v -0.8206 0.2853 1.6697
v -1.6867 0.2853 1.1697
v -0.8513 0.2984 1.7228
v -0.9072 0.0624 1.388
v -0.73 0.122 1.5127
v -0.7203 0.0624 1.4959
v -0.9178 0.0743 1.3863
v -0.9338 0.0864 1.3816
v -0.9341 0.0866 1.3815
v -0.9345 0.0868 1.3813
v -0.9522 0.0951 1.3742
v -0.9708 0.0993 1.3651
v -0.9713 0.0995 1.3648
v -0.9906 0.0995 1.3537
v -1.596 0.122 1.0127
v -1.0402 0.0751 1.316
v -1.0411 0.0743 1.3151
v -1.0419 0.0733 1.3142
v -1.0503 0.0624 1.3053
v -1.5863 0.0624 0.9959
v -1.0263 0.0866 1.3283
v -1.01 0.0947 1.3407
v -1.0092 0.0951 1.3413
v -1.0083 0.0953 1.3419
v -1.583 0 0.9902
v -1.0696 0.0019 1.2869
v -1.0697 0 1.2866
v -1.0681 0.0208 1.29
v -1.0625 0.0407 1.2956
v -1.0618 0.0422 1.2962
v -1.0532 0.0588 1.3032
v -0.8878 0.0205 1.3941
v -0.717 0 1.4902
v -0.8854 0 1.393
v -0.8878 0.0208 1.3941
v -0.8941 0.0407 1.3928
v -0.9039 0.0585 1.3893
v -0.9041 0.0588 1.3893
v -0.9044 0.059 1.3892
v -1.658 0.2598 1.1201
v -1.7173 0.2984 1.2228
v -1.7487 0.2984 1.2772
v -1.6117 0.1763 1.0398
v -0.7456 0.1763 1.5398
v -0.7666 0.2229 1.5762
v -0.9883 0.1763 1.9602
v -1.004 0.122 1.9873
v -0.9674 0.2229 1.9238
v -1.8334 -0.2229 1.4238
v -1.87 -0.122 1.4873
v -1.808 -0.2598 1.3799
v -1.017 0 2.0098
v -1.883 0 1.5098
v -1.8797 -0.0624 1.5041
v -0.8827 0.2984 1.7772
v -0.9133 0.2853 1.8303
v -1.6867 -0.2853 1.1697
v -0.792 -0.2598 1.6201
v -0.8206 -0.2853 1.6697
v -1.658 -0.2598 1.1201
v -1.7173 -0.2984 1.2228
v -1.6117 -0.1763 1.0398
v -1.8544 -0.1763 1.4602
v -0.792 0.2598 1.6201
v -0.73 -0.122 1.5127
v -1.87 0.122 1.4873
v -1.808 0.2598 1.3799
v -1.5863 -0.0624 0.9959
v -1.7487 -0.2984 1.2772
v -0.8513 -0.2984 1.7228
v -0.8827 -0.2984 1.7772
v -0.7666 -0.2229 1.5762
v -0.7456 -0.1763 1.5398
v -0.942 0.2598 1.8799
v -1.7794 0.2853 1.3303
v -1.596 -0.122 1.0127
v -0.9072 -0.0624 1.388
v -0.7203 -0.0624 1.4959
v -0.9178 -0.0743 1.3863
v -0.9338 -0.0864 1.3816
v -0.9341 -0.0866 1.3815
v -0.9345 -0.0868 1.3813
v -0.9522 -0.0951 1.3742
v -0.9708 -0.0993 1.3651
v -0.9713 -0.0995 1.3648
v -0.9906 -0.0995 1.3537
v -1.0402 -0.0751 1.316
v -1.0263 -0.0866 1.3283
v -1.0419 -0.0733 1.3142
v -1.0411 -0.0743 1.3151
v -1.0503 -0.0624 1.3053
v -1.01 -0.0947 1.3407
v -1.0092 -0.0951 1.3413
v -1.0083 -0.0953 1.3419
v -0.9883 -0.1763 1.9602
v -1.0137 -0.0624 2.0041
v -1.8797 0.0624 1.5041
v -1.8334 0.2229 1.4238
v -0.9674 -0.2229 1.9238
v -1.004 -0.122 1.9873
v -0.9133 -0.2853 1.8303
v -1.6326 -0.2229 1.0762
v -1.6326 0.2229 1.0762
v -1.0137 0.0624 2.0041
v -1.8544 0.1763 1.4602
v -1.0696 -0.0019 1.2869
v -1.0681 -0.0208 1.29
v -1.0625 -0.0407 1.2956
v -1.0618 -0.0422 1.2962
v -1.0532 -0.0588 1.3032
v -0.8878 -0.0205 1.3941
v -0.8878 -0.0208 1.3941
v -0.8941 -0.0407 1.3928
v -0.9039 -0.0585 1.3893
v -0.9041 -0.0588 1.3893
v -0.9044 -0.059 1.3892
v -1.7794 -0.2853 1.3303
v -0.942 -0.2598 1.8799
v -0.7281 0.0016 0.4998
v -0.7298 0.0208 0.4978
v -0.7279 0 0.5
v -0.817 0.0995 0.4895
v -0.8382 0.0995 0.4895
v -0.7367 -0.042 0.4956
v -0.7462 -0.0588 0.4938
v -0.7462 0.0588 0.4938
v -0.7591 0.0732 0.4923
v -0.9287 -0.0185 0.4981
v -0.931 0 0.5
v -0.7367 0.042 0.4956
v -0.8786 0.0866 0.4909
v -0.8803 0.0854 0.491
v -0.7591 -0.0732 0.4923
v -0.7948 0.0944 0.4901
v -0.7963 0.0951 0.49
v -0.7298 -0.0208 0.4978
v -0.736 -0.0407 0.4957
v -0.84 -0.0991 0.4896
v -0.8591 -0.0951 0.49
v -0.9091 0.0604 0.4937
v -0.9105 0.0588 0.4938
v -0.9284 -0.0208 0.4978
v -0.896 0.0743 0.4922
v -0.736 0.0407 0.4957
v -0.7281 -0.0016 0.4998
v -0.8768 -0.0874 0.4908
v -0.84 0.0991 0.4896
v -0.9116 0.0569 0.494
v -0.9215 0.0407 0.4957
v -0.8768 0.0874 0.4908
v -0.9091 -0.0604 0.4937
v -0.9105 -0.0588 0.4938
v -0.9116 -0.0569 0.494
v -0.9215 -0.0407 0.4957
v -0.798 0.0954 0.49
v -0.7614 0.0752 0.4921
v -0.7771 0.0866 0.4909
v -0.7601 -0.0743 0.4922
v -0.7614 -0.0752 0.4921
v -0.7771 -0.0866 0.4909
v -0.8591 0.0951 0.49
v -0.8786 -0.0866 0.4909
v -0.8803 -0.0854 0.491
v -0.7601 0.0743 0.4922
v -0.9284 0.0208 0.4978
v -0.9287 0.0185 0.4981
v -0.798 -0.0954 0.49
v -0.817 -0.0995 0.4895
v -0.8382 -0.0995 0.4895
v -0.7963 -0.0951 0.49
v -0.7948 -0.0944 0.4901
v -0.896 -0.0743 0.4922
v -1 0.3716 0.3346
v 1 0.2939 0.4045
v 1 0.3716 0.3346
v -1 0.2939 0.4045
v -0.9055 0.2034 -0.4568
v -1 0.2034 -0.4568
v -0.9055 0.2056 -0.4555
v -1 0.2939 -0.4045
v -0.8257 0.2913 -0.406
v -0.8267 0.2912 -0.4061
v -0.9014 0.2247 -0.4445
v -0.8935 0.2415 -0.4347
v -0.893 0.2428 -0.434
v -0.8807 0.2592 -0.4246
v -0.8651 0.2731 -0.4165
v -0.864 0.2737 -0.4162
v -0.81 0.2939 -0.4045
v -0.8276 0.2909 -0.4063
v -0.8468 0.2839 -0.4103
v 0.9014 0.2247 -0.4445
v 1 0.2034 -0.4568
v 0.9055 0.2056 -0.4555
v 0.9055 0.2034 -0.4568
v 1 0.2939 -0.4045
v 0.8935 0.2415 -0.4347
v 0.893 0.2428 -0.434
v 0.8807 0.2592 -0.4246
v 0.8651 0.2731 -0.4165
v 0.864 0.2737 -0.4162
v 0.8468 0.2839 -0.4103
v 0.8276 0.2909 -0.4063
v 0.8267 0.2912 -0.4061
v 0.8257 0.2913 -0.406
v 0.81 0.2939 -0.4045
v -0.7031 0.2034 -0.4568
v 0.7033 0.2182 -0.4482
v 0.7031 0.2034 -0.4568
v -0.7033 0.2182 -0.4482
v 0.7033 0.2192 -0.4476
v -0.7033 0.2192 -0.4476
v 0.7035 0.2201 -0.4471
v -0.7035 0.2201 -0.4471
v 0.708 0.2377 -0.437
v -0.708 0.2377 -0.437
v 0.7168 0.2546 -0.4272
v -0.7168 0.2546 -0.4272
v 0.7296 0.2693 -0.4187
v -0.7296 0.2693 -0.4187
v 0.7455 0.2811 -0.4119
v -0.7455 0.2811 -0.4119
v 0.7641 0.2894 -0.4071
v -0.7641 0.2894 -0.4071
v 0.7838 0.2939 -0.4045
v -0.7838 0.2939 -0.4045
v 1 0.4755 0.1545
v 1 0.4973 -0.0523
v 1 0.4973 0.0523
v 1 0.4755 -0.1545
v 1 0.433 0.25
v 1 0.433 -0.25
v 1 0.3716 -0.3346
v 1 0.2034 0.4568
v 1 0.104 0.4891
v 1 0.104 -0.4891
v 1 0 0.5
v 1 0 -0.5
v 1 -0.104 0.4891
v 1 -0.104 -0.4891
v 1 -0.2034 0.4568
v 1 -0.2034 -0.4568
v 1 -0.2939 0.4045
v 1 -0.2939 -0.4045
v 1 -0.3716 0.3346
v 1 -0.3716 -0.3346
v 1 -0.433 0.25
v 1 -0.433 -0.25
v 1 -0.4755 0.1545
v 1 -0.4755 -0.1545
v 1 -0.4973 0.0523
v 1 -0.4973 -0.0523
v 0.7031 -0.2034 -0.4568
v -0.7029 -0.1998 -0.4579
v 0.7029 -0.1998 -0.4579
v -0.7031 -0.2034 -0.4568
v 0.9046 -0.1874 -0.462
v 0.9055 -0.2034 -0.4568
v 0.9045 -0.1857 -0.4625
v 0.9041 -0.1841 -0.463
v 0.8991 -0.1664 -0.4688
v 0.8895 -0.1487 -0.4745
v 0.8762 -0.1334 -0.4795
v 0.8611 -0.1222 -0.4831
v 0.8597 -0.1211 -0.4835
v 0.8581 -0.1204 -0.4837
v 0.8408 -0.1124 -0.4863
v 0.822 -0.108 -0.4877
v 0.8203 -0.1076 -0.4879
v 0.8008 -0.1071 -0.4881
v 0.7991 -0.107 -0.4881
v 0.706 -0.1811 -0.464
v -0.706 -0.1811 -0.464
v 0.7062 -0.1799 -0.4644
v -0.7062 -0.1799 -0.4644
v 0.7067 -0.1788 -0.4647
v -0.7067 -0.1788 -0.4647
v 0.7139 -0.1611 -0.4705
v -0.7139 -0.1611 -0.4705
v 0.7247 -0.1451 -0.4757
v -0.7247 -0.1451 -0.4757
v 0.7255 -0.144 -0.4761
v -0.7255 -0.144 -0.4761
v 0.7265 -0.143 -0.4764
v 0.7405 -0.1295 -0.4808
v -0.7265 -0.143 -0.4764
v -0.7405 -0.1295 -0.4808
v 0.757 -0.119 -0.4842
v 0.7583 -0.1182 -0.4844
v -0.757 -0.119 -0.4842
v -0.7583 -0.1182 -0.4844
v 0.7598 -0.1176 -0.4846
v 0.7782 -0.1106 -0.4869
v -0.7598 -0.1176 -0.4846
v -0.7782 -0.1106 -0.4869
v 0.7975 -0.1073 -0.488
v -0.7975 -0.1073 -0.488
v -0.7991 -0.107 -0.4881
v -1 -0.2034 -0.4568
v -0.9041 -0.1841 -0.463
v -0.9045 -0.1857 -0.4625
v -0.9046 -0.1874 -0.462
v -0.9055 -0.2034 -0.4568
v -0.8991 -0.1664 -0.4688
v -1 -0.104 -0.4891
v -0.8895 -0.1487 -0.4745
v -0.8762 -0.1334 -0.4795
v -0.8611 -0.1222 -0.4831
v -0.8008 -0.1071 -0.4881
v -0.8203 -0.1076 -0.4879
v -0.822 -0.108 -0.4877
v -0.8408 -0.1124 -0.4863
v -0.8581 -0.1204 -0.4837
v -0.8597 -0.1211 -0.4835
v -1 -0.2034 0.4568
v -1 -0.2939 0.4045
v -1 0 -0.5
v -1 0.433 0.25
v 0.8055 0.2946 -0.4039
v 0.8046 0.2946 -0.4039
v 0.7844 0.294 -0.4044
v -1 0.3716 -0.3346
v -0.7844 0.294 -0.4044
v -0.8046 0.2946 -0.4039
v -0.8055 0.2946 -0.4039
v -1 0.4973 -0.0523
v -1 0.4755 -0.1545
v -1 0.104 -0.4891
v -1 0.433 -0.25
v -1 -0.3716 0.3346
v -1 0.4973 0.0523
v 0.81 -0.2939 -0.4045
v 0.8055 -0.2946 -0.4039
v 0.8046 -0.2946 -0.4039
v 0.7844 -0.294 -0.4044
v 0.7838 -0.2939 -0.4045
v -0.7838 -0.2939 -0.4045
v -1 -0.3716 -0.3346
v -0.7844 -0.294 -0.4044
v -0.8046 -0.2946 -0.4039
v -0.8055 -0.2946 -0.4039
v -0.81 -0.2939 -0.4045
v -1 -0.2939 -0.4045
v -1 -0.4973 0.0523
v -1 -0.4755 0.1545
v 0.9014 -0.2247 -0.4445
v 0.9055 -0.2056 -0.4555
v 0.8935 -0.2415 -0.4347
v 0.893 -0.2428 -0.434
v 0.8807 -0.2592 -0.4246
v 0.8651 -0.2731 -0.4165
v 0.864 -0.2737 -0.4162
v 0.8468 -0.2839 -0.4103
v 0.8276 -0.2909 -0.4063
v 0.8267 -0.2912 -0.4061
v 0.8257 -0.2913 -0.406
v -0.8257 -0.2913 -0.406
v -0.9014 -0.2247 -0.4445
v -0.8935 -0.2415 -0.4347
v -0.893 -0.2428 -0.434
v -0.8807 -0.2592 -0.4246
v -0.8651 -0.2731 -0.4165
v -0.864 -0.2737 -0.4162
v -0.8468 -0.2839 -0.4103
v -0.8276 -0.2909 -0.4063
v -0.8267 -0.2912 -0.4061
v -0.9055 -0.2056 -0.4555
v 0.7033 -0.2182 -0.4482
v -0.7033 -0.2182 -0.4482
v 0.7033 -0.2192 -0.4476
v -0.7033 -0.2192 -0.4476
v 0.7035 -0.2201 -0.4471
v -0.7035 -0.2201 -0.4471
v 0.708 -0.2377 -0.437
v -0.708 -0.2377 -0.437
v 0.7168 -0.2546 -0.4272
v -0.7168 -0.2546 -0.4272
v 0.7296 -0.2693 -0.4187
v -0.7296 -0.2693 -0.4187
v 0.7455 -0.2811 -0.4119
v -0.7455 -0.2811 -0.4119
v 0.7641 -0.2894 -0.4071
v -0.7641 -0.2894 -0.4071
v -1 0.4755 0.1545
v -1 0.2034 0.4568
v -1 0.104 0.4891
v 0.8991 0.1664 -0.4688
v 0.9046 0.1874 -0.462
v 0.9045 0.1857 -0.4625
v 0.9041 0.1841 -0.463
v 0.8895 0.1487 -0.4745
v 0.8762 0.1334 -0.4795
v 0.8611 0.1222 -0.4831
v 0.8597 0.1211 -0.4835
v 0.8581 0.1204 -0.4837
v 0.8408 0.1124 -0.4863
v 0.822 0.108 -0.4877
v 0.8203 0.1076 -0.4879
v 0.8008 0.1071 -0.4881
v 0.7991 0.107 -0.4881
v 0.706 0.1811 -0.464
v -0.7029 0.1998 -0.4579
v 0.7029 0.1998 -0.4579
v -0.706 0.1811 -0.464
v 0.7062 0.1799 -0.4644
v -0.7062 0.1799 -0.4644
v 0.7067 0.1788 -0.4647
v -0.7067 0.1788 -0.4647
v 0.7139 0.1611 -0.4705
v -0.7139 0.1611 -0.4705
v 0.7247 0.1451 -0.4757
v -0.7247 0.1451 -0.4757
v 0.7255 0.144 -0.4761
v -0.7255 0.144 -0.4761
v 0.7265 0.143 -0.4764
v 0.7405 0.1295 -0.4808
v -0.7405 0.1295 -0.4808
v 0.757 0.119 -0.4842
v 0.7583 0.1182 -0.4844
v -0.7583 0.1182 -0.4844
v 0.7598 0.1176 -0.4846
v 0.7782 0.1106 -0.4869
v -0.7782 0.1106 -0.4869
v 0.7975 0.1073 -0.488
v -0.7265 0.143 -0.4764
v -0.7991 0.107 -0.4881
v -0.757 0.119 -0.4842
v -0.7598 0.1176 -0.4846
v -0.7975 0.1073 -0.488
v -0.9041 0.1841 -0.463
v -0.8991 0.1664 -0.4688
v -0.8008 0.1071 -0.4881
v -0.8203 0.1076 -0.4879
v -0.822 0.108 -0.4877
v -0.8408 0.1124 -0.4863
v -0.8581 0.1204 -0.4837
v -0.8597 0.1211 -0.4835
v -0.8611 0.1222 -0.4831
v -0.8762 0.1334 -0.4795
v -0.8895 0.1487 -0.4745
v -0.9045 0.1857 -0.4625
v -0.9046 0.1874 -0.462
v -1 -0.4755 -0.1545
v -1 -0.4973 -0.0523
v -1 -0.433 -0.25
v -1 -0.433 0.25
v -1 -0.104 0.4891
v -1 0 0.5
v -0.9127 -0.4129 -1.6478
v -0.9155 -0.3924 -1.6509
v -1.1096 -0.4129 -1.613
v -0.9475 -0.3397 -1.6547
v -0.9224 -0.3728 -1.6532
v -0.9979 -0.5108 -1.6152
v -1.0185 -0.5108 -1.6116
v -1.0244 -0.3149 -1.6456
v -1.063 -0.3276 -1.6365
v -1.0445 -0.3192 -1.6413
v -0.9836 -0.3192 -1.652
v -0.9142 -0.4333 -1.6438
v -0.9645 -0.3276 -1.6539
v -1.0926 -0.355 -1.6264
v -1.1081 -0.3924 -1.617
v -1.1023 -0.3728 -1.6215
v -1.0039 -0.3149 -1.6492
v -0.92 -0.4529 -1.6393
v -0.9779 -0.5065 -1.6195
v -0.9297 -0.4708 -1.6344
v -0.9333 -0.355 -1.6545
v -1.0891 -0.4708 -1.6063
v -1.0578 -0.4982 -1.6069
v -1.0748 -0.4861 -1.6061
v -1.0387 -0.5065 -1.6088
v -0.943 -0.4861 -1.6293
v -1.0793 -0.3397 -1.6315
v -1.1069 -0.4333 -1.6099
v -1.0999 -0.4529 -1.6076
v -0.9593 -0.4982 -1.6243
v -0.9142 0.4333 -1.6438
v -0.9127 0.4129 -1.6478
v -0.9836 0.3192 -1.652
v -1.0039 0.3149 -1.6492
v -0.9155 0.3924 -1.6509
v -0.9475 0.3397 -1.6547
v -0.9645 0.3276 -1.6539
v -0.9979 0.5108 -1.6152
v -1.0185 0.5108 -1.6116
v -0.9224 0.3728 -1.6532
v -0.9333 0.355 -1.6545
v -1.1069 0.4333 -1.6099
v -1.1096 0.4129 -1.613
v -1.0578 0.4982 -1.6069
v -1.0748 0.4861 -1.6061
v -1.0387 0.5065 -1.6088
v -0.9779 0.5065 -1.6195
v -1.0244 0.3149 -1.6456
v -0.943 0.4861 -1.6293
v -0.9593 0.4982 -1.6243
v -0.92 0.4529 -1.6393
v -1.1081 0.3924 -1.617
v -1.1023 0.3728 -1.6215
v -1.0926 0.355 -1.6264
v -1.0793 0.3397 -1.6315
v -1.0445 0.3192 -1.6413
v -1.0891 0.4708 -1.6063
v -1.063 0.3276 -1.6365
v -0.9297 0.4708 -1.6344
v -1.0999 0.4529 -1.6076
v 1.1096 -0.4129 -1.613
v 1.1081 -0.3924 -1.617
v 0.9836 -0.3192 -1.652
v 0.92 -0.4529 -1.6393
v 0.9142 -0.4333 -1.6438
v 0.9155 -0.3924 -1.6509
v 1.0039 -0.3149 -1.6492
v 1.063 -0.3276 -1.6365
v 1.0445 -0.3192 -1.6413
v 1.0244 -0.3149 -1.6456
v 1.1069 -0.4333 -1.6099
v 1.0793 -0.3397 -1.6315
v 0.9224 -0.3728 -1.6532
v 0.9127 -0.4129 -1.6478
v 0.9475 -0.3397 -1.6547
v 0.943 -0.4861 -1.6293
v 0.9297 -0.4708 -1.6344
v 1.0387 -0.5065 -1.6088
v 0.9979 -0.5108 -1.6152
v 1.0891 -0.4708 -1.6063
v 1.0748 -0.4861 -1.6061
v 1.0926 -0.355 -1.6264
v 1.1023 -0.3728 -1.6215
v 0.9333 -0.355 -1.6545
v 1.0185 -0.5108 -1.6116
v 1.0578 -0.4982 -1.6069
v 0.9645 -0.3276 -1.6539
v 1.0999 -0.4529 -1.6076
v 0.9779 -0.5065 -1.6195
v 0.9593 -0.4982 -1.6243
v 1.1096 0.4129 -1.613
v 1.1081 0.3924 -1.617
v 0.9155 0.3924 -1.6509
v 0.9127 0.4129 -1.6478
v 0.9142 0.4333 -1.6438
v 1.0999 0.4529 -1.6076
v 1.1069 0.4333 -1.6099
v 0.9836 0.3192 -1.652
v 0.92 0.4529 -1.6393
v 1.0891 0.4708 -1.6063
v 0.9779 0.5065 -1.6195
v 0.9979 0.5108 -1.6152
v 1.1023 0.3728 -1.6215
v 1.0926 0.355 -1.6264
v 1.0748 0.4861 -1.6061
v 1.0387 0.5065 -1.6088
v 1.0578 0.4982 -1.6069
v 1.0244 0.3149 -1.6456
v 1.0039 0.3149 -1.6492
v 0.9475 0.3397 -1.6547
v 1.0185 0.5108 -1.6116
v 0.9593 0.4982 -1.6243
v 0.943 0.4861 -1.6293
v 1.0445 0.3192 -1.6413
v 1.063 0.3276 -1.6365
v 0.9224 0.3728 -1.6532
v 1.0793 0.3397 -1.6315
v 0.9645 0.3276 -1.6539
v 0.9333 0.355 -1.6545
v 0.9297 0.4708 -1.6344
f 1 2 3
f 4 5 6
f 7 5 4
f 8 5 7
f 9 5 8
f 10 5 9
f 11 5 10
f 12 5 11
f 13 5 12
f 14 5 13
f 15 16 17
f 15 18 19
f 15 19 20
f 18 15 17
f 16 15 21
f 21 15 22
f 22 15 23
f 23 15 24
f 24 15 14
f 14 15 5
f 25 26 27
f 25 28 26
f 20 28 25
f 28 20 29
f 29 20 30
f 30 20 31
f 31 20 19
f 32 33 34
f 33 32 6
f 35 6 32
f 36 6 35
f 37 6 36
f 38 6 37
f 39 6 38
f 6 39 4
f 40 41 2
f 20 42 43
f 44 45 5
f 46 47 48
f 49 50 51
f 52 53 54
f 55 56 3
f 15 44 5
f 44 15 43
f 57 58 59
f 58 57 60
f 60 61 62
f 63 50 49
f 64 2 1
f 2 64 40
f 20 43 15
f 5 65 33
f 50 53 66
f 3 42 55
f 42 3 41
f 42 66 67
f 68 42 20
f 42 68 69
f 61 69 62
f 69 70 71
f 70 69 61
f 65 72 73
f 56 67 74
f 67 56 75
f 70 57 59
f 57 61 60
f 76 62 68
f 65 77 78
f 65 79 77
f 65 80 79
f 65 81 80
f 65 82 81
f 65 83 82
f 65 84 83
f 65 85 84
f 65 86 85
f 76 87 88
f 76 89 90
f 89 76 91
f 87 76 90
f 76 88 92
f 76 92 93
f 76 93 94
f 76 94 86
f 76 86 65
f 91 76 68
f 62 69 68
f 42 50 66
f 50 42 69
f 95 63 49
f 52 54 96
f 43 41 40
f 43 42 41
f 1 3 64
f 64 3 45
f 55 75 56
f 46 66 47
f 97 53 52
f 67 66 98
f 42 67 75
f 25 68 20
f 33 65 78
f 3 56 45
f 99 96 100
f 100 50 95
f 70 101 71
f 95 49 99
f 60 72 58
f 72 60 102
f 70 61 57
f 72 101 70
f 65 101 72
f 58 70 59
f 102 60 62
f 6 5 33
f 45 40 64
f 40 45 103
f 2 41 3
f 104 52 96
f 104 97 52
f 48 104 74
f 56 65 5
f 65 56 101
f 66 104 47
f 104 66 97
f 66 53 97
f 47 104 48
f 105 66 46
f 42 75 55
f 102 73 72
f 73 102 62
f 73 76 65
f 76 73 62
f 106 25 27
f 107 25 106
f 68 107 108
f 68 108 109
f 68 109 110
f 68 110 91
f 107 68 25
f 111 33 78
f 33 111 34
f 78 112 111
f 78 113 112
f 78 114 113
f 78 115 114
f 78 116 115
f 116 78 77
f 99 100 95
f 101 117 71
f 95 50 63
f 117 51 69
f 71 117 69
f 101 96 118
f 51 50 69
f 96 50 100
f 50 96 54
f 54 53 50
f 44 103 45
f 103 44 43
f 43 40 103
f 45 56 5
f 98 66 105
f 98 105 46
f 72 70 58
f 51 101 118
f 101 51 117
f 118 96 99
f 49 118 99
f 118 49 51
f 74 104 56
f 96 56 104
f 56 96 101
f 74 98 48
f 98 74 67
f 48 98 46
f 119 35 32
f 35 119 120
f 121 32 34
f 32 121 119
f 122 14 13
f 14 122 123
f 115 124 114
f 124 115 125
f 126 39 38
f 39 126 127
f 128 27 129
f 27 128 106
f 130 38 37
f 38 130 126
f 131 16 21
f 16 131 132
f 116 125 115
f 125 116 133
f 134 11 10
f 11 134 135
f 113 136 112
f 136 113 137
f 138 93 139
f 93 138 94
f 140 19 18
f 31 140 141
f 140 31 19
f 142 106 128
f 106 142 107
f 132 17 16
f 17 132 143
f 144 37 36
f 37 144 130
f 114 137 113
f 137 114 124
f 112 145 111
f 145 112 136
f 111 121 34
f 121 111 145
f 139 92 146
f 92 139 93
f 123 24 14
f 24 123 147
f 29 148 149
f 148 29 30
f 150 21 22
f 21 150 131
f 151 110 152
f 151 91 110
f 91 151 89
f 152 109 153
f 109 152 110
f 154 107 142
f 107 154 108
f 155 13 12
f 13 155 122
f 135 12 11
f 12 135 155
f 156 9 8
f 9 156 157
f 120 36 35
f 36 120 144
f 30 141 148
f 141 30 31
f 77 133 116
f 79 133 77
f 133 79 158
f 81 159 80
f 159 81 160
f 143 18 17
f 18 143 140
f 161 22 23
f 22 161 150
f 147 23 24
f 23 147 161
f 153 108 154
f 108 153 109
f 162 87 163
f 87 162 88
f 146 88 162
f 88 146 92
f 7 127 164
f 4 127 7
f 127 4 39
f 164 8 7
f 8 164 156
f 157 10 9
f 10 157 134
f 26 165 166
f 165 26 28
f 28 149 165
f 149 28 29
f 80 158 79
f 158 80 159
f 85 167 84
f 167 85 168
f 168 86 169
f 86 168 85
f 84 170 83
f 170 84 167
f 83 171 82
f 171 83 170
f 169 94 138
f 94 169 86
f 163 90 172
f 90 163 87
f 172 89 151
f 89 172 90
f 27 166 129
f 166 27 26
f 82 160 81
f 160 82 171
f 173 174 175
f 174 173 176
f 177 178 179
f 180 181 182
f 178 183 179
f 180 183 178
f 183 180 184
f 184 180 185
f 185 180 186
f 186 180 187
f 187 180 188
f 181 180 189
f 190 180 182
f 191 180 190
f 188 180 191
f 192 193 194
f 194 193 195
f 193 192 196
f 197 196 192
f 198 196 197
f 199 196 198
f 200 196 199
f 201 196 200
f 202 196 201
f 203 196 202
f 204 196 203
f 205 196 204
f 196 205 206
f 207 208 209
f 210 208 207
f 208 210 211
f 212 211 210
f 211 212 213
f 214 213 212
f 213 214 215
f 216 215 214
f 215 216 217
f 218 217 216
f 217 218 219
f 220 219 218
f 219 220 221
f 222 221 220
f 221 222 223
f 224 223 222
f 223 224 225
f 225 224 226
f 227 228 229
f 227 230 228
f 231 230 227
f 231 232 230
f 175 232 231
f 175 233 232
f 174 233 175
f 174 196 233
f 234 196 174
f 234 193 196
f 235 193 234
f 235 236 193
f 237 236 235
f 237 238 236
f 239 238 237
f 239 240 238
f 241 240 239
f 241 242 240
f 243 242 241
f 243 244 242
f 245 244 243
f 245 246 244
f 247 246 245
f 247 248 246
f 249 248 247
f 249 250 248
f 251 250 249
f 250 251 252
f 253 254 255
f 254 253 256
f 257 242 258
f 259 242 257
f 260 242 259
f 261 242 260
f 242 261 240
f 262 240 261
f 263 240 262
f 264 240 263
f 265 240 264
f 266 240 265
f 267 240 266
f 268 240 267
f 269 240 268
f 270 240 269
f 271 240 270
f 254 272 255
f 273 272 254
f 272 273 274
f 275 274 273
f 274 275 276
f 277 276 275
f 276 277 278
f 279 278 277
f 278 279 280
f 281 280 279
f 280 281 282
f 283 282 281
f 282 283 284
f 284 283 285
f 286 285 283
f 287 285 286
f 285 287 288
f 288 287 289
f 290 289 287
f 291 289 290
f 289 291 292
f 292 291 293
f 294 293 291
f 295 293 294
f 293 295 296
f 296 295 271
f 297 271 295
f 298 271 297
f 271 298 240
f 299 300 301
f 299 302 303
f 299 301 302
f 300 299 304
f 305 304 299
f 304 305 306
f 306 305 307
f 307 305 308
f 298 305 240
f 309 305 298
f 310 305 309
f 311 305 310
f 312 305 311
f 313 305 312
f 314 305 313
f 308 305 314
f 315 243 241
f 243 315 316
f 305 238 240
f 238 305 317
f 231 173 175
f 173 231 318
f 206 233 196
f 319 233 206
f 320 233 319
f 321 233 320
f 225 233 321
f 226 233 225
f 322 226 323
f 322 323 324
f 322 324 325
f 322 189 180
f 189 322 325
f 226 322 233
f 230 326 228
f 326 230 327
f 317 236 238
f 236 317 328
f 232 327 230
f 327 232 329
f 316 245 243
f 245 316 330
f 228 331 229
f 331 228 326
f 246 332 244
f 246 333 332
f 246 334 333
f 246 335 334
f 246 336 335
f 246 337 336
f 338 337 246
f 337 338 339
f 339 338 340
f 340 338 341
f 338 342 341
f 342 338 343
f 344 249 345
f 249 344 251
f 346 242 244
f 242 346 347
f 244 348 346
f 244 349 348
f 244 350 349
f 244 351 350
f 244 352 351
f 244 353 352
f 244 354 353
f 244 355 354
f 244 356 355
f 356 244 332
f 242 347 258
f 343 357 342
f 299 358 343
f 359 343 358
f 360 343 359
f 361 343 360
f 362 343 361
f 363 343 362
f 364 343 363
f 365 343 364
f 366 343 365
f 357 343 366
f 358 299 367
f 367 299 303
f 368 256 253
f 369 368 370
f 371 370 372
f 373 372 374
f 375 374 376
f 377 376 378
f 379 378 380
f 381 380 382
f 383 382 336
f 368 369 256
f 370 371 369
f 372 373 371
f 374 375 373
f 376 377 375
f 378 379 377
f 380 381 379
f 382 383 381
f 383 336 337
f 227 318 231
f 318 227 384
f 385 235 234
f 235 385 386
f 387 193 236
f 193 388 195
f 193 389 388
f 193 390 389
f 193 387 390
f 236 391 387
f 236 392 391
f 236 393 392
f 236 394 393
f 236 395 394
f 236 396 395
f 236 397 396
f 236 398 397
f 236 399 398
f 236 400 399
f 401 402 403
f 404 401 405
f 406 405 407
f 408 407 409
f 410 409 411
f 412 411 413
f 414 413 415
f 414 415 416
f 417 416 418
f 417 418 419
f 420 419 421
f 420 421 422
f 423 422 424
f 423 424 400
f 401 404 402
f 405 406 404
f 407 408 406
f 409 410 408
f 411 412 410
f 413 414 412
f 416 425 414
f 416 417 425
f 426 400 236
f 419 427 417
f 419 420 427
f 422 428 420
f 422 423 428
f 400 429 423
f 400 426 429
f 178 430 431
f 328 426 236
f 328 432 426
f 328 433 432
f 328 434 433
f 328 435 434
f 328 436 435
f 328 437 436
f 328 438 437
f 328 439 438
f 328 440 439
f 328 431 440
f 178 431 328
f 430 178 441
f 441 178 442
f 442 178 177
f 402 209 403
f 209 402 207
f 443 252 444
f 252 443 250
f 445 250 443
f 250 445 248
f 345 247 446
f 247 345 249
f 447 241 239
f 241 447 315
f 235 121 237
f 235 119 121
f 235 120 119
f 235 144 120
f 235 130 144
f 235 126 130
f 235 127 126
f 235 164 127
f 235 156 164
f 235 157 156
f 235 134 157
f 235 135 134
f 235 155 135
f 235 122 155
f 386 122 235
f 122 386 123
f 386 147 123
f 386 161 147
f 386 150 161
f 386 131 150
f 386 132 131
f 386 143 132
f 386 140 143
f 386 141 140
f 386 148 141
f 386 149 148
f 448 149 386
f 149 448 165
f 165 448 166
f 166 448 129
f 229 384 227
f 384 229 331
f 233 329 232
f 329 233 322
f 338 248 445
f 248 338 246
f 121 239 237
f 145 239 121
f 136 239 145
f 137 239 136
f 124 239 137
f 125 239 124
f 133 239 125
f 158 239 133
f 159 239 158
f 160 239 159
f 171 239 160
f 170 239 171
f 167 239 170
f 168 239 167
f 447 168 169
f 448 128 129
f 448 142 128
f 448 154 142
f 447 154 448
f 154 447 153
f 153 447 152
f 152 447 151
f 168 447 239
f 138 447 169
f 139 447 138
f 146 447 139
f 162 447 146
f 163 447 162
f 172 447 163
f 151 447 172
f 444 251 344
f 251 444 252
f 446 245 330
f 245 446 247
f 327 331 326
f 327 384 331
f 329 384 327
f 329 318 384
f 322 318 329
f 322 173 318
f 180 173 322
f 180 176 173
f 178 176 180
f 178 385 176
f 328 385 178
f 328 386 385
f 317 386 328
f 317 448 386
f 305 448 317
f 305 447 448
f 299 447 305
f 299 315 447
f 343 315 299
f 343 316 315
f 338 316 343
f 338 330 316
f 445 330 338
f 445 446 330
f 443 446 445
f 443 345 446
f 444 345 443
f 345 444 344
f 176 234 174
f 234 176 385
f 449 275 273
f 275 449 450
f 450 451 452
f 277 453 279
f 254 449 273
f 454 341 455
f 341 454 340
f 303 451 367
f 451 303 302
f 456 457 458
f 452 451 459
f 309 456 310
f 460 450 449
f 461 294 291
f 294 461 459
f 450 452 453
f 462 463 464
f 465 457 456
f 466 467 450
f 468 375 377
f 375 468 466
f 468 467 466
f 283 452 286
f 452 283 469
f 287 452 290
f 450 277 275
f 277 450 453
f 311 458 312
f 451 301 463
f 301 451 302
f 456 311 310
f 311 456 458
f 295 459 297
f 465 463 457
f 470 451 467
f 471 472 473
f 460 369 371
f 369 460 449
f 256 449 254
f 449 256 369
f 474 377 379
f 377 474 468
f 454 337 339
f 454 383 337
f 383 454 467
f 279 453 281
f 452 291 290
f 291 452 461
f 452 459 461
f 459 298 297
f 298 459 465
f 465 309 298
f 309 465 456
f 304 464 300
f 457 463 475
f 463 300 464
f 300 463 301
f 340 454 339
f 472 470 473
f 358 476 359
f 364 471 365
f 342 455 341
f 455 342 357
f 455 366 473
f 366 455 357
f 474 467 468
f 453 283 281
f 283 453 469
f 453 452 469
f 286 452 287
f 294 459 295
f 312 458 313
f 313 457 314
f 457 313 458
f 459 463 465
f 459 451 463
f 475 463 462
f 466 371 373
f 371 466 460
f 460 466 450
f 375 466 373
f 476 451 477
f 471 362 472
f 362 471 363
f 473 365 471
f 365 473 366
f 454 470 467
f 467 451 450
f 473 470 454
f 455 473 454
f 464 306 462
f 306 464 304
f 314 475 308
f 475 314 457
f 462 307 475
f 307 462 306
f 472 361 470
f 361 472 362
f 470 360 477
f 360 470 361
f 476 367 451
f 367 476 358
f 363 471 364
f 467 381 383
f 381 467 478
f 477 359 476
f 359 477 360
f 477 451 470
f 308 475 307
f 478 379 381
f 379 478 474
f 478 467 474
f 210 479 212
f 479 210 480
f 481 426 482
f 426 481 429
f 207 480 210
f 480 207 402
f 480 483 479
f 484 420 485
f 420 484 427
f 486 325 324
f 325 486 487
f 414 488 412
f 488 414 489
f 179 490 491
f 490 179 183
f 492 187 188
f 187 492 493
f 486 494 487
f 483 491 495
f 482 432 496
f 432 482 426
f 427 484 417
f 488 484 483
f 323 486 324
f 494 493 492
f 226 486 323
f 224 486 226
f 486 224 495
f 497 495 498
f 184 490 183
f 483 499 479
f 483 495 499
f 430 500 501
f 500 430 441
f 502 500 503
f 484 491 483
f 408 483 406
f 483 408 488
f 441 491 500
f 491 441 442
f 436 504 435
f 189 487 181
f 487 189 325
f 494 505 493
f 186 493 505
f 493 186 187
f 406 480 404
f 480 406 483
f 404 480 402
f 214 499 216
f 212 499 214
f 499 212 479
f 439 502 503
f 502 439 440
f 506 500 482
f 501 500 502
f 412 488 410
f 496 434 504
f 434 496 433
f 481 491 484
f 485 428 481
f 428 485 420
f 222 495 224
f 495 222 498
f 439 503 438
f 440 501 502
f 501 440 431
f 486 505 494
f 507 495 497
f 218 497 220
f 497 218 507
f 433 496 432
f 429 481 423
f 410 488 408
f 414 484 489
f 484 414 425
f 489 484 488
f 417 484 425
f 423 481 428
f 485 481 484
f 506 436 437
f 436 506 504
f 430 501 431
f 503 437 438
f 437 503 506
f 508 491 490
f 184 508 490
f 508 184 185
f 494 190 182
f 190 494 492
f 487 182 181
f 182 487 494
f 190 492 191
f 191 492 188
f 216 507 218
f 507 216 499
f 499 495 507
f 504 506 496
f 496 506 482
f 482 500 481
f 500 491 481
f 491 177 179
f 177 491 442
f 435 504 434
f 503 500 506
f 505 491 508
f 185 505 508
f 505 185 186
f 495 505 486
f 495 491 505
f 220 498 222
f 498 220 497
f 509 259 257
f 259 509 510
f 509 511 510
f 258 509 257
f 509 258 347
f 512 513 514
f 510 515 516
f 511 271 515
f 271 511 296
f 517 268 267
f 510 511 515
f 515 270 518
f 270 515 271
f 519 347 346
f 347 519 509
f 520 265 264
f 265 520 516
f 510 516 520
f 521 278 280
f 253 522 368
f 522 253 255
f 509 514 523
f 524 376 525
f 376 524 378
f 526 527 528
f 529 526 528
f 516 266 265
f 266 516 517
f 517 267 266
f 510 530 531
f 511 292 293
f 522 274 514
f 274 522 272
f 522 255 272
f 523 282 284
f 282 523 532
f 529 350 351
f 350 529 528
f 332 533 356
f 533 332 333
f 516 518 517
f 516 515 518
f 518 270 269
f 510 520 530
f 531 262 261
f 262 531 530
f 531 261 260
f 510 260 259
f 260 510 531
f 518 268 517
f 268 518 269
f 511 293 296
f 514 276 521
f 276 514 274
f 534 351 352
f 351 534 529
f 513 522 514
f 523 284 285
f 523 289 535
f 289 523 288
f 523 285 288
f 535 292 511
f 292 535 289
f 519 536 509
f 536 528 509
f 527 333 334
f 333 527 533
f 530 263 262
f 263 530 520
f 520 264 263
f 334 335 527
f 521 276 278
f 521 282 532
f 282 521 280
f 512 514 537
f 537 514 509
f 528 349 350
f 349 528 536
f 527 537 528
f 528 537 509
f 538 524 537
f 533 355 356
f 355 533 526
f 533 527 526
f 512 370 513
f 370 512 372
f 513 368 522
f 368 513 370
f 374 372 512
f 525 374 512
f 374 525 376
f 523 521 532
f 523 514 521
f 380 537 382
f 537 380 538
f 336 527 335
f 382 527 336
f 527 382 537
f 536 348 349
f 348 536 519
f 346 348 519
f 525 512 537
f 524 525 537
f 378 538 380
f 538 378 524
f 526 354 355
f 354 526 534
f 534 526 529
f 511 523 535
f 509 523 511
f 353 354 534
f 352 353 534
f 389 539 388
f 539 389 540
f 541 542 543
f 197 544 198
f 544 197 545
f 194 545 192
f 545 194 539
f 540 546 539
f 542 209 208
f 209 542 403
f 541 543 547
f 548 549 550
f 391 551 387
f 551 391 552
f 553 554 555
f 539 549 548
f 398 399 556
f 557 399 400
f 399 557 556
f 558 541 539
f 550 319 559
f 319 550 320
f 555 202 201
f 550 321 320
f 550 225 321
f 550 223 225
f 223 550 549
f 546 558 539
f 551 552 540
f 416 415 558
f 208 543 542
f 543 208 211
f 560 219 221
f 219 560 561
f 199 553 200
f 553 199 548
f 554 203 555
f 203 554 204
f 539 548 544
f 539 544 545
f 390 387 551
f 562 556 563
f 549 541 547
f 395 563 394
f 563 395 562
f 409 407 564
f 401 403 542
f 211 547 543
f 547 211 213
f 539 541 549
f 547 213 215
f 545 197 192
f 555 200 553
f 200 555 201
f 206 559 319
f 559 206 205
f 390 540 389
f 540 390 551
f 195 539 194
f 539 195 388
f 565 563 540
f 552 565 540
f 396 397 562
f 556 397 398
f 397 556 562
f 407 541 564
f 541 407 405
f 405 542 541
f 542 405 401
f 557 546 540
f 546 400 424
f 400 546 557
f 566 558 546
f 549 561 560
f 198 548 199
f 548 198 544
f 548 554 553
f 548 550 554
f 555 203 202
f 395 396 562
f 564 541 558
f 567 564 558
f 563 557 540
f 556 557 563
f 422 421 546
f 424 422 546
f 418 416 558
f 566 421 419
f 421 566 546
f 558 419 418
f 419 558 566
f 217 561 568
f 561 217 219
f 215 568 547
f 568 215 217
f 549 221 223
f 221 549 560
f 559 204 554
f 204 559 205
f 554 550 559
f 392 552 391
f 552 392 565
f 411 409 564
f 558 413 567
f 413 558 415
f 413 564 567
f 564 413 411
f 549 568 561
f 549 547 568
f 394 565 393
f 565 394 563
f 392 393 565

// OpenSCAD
union() {
    translate([-0.9,0,0.9]) {
        translate([-0.4,0,0.6]) rotate([0,60,0])
            cylinder(h=1,r=0.3,center=true,$fn=30);
        rotate([0,-10,0])
            cylinder(h=1,r=0.1,center=true,$fn=30);
    }
    rotate([0,90,0])
        cylinder(h=2,r=0.5,center=true,$fn=30);
    translate([-0.9,-0.3,-1])
        rotate([-10,10,0])
            cylinder(h=1.3,r=0.1,center=true,$fn=30);
    translate([-0.9,0.3,-1])
        rotate([10,10,0])
            cylinder(h=1.3,r=0.1,center=true,$fn=30);
    translate([0.9,-0.3,-1])
        rotate([-10,-10,0])
            cylinder(h=1.3,r=0.1,center=true,$fn=30);
    translate([0.9,0.3,-1])
        rotate([10,-10,0])
            cylinder(h=1.3,r=0.1,center=true,$fn=30);
}
